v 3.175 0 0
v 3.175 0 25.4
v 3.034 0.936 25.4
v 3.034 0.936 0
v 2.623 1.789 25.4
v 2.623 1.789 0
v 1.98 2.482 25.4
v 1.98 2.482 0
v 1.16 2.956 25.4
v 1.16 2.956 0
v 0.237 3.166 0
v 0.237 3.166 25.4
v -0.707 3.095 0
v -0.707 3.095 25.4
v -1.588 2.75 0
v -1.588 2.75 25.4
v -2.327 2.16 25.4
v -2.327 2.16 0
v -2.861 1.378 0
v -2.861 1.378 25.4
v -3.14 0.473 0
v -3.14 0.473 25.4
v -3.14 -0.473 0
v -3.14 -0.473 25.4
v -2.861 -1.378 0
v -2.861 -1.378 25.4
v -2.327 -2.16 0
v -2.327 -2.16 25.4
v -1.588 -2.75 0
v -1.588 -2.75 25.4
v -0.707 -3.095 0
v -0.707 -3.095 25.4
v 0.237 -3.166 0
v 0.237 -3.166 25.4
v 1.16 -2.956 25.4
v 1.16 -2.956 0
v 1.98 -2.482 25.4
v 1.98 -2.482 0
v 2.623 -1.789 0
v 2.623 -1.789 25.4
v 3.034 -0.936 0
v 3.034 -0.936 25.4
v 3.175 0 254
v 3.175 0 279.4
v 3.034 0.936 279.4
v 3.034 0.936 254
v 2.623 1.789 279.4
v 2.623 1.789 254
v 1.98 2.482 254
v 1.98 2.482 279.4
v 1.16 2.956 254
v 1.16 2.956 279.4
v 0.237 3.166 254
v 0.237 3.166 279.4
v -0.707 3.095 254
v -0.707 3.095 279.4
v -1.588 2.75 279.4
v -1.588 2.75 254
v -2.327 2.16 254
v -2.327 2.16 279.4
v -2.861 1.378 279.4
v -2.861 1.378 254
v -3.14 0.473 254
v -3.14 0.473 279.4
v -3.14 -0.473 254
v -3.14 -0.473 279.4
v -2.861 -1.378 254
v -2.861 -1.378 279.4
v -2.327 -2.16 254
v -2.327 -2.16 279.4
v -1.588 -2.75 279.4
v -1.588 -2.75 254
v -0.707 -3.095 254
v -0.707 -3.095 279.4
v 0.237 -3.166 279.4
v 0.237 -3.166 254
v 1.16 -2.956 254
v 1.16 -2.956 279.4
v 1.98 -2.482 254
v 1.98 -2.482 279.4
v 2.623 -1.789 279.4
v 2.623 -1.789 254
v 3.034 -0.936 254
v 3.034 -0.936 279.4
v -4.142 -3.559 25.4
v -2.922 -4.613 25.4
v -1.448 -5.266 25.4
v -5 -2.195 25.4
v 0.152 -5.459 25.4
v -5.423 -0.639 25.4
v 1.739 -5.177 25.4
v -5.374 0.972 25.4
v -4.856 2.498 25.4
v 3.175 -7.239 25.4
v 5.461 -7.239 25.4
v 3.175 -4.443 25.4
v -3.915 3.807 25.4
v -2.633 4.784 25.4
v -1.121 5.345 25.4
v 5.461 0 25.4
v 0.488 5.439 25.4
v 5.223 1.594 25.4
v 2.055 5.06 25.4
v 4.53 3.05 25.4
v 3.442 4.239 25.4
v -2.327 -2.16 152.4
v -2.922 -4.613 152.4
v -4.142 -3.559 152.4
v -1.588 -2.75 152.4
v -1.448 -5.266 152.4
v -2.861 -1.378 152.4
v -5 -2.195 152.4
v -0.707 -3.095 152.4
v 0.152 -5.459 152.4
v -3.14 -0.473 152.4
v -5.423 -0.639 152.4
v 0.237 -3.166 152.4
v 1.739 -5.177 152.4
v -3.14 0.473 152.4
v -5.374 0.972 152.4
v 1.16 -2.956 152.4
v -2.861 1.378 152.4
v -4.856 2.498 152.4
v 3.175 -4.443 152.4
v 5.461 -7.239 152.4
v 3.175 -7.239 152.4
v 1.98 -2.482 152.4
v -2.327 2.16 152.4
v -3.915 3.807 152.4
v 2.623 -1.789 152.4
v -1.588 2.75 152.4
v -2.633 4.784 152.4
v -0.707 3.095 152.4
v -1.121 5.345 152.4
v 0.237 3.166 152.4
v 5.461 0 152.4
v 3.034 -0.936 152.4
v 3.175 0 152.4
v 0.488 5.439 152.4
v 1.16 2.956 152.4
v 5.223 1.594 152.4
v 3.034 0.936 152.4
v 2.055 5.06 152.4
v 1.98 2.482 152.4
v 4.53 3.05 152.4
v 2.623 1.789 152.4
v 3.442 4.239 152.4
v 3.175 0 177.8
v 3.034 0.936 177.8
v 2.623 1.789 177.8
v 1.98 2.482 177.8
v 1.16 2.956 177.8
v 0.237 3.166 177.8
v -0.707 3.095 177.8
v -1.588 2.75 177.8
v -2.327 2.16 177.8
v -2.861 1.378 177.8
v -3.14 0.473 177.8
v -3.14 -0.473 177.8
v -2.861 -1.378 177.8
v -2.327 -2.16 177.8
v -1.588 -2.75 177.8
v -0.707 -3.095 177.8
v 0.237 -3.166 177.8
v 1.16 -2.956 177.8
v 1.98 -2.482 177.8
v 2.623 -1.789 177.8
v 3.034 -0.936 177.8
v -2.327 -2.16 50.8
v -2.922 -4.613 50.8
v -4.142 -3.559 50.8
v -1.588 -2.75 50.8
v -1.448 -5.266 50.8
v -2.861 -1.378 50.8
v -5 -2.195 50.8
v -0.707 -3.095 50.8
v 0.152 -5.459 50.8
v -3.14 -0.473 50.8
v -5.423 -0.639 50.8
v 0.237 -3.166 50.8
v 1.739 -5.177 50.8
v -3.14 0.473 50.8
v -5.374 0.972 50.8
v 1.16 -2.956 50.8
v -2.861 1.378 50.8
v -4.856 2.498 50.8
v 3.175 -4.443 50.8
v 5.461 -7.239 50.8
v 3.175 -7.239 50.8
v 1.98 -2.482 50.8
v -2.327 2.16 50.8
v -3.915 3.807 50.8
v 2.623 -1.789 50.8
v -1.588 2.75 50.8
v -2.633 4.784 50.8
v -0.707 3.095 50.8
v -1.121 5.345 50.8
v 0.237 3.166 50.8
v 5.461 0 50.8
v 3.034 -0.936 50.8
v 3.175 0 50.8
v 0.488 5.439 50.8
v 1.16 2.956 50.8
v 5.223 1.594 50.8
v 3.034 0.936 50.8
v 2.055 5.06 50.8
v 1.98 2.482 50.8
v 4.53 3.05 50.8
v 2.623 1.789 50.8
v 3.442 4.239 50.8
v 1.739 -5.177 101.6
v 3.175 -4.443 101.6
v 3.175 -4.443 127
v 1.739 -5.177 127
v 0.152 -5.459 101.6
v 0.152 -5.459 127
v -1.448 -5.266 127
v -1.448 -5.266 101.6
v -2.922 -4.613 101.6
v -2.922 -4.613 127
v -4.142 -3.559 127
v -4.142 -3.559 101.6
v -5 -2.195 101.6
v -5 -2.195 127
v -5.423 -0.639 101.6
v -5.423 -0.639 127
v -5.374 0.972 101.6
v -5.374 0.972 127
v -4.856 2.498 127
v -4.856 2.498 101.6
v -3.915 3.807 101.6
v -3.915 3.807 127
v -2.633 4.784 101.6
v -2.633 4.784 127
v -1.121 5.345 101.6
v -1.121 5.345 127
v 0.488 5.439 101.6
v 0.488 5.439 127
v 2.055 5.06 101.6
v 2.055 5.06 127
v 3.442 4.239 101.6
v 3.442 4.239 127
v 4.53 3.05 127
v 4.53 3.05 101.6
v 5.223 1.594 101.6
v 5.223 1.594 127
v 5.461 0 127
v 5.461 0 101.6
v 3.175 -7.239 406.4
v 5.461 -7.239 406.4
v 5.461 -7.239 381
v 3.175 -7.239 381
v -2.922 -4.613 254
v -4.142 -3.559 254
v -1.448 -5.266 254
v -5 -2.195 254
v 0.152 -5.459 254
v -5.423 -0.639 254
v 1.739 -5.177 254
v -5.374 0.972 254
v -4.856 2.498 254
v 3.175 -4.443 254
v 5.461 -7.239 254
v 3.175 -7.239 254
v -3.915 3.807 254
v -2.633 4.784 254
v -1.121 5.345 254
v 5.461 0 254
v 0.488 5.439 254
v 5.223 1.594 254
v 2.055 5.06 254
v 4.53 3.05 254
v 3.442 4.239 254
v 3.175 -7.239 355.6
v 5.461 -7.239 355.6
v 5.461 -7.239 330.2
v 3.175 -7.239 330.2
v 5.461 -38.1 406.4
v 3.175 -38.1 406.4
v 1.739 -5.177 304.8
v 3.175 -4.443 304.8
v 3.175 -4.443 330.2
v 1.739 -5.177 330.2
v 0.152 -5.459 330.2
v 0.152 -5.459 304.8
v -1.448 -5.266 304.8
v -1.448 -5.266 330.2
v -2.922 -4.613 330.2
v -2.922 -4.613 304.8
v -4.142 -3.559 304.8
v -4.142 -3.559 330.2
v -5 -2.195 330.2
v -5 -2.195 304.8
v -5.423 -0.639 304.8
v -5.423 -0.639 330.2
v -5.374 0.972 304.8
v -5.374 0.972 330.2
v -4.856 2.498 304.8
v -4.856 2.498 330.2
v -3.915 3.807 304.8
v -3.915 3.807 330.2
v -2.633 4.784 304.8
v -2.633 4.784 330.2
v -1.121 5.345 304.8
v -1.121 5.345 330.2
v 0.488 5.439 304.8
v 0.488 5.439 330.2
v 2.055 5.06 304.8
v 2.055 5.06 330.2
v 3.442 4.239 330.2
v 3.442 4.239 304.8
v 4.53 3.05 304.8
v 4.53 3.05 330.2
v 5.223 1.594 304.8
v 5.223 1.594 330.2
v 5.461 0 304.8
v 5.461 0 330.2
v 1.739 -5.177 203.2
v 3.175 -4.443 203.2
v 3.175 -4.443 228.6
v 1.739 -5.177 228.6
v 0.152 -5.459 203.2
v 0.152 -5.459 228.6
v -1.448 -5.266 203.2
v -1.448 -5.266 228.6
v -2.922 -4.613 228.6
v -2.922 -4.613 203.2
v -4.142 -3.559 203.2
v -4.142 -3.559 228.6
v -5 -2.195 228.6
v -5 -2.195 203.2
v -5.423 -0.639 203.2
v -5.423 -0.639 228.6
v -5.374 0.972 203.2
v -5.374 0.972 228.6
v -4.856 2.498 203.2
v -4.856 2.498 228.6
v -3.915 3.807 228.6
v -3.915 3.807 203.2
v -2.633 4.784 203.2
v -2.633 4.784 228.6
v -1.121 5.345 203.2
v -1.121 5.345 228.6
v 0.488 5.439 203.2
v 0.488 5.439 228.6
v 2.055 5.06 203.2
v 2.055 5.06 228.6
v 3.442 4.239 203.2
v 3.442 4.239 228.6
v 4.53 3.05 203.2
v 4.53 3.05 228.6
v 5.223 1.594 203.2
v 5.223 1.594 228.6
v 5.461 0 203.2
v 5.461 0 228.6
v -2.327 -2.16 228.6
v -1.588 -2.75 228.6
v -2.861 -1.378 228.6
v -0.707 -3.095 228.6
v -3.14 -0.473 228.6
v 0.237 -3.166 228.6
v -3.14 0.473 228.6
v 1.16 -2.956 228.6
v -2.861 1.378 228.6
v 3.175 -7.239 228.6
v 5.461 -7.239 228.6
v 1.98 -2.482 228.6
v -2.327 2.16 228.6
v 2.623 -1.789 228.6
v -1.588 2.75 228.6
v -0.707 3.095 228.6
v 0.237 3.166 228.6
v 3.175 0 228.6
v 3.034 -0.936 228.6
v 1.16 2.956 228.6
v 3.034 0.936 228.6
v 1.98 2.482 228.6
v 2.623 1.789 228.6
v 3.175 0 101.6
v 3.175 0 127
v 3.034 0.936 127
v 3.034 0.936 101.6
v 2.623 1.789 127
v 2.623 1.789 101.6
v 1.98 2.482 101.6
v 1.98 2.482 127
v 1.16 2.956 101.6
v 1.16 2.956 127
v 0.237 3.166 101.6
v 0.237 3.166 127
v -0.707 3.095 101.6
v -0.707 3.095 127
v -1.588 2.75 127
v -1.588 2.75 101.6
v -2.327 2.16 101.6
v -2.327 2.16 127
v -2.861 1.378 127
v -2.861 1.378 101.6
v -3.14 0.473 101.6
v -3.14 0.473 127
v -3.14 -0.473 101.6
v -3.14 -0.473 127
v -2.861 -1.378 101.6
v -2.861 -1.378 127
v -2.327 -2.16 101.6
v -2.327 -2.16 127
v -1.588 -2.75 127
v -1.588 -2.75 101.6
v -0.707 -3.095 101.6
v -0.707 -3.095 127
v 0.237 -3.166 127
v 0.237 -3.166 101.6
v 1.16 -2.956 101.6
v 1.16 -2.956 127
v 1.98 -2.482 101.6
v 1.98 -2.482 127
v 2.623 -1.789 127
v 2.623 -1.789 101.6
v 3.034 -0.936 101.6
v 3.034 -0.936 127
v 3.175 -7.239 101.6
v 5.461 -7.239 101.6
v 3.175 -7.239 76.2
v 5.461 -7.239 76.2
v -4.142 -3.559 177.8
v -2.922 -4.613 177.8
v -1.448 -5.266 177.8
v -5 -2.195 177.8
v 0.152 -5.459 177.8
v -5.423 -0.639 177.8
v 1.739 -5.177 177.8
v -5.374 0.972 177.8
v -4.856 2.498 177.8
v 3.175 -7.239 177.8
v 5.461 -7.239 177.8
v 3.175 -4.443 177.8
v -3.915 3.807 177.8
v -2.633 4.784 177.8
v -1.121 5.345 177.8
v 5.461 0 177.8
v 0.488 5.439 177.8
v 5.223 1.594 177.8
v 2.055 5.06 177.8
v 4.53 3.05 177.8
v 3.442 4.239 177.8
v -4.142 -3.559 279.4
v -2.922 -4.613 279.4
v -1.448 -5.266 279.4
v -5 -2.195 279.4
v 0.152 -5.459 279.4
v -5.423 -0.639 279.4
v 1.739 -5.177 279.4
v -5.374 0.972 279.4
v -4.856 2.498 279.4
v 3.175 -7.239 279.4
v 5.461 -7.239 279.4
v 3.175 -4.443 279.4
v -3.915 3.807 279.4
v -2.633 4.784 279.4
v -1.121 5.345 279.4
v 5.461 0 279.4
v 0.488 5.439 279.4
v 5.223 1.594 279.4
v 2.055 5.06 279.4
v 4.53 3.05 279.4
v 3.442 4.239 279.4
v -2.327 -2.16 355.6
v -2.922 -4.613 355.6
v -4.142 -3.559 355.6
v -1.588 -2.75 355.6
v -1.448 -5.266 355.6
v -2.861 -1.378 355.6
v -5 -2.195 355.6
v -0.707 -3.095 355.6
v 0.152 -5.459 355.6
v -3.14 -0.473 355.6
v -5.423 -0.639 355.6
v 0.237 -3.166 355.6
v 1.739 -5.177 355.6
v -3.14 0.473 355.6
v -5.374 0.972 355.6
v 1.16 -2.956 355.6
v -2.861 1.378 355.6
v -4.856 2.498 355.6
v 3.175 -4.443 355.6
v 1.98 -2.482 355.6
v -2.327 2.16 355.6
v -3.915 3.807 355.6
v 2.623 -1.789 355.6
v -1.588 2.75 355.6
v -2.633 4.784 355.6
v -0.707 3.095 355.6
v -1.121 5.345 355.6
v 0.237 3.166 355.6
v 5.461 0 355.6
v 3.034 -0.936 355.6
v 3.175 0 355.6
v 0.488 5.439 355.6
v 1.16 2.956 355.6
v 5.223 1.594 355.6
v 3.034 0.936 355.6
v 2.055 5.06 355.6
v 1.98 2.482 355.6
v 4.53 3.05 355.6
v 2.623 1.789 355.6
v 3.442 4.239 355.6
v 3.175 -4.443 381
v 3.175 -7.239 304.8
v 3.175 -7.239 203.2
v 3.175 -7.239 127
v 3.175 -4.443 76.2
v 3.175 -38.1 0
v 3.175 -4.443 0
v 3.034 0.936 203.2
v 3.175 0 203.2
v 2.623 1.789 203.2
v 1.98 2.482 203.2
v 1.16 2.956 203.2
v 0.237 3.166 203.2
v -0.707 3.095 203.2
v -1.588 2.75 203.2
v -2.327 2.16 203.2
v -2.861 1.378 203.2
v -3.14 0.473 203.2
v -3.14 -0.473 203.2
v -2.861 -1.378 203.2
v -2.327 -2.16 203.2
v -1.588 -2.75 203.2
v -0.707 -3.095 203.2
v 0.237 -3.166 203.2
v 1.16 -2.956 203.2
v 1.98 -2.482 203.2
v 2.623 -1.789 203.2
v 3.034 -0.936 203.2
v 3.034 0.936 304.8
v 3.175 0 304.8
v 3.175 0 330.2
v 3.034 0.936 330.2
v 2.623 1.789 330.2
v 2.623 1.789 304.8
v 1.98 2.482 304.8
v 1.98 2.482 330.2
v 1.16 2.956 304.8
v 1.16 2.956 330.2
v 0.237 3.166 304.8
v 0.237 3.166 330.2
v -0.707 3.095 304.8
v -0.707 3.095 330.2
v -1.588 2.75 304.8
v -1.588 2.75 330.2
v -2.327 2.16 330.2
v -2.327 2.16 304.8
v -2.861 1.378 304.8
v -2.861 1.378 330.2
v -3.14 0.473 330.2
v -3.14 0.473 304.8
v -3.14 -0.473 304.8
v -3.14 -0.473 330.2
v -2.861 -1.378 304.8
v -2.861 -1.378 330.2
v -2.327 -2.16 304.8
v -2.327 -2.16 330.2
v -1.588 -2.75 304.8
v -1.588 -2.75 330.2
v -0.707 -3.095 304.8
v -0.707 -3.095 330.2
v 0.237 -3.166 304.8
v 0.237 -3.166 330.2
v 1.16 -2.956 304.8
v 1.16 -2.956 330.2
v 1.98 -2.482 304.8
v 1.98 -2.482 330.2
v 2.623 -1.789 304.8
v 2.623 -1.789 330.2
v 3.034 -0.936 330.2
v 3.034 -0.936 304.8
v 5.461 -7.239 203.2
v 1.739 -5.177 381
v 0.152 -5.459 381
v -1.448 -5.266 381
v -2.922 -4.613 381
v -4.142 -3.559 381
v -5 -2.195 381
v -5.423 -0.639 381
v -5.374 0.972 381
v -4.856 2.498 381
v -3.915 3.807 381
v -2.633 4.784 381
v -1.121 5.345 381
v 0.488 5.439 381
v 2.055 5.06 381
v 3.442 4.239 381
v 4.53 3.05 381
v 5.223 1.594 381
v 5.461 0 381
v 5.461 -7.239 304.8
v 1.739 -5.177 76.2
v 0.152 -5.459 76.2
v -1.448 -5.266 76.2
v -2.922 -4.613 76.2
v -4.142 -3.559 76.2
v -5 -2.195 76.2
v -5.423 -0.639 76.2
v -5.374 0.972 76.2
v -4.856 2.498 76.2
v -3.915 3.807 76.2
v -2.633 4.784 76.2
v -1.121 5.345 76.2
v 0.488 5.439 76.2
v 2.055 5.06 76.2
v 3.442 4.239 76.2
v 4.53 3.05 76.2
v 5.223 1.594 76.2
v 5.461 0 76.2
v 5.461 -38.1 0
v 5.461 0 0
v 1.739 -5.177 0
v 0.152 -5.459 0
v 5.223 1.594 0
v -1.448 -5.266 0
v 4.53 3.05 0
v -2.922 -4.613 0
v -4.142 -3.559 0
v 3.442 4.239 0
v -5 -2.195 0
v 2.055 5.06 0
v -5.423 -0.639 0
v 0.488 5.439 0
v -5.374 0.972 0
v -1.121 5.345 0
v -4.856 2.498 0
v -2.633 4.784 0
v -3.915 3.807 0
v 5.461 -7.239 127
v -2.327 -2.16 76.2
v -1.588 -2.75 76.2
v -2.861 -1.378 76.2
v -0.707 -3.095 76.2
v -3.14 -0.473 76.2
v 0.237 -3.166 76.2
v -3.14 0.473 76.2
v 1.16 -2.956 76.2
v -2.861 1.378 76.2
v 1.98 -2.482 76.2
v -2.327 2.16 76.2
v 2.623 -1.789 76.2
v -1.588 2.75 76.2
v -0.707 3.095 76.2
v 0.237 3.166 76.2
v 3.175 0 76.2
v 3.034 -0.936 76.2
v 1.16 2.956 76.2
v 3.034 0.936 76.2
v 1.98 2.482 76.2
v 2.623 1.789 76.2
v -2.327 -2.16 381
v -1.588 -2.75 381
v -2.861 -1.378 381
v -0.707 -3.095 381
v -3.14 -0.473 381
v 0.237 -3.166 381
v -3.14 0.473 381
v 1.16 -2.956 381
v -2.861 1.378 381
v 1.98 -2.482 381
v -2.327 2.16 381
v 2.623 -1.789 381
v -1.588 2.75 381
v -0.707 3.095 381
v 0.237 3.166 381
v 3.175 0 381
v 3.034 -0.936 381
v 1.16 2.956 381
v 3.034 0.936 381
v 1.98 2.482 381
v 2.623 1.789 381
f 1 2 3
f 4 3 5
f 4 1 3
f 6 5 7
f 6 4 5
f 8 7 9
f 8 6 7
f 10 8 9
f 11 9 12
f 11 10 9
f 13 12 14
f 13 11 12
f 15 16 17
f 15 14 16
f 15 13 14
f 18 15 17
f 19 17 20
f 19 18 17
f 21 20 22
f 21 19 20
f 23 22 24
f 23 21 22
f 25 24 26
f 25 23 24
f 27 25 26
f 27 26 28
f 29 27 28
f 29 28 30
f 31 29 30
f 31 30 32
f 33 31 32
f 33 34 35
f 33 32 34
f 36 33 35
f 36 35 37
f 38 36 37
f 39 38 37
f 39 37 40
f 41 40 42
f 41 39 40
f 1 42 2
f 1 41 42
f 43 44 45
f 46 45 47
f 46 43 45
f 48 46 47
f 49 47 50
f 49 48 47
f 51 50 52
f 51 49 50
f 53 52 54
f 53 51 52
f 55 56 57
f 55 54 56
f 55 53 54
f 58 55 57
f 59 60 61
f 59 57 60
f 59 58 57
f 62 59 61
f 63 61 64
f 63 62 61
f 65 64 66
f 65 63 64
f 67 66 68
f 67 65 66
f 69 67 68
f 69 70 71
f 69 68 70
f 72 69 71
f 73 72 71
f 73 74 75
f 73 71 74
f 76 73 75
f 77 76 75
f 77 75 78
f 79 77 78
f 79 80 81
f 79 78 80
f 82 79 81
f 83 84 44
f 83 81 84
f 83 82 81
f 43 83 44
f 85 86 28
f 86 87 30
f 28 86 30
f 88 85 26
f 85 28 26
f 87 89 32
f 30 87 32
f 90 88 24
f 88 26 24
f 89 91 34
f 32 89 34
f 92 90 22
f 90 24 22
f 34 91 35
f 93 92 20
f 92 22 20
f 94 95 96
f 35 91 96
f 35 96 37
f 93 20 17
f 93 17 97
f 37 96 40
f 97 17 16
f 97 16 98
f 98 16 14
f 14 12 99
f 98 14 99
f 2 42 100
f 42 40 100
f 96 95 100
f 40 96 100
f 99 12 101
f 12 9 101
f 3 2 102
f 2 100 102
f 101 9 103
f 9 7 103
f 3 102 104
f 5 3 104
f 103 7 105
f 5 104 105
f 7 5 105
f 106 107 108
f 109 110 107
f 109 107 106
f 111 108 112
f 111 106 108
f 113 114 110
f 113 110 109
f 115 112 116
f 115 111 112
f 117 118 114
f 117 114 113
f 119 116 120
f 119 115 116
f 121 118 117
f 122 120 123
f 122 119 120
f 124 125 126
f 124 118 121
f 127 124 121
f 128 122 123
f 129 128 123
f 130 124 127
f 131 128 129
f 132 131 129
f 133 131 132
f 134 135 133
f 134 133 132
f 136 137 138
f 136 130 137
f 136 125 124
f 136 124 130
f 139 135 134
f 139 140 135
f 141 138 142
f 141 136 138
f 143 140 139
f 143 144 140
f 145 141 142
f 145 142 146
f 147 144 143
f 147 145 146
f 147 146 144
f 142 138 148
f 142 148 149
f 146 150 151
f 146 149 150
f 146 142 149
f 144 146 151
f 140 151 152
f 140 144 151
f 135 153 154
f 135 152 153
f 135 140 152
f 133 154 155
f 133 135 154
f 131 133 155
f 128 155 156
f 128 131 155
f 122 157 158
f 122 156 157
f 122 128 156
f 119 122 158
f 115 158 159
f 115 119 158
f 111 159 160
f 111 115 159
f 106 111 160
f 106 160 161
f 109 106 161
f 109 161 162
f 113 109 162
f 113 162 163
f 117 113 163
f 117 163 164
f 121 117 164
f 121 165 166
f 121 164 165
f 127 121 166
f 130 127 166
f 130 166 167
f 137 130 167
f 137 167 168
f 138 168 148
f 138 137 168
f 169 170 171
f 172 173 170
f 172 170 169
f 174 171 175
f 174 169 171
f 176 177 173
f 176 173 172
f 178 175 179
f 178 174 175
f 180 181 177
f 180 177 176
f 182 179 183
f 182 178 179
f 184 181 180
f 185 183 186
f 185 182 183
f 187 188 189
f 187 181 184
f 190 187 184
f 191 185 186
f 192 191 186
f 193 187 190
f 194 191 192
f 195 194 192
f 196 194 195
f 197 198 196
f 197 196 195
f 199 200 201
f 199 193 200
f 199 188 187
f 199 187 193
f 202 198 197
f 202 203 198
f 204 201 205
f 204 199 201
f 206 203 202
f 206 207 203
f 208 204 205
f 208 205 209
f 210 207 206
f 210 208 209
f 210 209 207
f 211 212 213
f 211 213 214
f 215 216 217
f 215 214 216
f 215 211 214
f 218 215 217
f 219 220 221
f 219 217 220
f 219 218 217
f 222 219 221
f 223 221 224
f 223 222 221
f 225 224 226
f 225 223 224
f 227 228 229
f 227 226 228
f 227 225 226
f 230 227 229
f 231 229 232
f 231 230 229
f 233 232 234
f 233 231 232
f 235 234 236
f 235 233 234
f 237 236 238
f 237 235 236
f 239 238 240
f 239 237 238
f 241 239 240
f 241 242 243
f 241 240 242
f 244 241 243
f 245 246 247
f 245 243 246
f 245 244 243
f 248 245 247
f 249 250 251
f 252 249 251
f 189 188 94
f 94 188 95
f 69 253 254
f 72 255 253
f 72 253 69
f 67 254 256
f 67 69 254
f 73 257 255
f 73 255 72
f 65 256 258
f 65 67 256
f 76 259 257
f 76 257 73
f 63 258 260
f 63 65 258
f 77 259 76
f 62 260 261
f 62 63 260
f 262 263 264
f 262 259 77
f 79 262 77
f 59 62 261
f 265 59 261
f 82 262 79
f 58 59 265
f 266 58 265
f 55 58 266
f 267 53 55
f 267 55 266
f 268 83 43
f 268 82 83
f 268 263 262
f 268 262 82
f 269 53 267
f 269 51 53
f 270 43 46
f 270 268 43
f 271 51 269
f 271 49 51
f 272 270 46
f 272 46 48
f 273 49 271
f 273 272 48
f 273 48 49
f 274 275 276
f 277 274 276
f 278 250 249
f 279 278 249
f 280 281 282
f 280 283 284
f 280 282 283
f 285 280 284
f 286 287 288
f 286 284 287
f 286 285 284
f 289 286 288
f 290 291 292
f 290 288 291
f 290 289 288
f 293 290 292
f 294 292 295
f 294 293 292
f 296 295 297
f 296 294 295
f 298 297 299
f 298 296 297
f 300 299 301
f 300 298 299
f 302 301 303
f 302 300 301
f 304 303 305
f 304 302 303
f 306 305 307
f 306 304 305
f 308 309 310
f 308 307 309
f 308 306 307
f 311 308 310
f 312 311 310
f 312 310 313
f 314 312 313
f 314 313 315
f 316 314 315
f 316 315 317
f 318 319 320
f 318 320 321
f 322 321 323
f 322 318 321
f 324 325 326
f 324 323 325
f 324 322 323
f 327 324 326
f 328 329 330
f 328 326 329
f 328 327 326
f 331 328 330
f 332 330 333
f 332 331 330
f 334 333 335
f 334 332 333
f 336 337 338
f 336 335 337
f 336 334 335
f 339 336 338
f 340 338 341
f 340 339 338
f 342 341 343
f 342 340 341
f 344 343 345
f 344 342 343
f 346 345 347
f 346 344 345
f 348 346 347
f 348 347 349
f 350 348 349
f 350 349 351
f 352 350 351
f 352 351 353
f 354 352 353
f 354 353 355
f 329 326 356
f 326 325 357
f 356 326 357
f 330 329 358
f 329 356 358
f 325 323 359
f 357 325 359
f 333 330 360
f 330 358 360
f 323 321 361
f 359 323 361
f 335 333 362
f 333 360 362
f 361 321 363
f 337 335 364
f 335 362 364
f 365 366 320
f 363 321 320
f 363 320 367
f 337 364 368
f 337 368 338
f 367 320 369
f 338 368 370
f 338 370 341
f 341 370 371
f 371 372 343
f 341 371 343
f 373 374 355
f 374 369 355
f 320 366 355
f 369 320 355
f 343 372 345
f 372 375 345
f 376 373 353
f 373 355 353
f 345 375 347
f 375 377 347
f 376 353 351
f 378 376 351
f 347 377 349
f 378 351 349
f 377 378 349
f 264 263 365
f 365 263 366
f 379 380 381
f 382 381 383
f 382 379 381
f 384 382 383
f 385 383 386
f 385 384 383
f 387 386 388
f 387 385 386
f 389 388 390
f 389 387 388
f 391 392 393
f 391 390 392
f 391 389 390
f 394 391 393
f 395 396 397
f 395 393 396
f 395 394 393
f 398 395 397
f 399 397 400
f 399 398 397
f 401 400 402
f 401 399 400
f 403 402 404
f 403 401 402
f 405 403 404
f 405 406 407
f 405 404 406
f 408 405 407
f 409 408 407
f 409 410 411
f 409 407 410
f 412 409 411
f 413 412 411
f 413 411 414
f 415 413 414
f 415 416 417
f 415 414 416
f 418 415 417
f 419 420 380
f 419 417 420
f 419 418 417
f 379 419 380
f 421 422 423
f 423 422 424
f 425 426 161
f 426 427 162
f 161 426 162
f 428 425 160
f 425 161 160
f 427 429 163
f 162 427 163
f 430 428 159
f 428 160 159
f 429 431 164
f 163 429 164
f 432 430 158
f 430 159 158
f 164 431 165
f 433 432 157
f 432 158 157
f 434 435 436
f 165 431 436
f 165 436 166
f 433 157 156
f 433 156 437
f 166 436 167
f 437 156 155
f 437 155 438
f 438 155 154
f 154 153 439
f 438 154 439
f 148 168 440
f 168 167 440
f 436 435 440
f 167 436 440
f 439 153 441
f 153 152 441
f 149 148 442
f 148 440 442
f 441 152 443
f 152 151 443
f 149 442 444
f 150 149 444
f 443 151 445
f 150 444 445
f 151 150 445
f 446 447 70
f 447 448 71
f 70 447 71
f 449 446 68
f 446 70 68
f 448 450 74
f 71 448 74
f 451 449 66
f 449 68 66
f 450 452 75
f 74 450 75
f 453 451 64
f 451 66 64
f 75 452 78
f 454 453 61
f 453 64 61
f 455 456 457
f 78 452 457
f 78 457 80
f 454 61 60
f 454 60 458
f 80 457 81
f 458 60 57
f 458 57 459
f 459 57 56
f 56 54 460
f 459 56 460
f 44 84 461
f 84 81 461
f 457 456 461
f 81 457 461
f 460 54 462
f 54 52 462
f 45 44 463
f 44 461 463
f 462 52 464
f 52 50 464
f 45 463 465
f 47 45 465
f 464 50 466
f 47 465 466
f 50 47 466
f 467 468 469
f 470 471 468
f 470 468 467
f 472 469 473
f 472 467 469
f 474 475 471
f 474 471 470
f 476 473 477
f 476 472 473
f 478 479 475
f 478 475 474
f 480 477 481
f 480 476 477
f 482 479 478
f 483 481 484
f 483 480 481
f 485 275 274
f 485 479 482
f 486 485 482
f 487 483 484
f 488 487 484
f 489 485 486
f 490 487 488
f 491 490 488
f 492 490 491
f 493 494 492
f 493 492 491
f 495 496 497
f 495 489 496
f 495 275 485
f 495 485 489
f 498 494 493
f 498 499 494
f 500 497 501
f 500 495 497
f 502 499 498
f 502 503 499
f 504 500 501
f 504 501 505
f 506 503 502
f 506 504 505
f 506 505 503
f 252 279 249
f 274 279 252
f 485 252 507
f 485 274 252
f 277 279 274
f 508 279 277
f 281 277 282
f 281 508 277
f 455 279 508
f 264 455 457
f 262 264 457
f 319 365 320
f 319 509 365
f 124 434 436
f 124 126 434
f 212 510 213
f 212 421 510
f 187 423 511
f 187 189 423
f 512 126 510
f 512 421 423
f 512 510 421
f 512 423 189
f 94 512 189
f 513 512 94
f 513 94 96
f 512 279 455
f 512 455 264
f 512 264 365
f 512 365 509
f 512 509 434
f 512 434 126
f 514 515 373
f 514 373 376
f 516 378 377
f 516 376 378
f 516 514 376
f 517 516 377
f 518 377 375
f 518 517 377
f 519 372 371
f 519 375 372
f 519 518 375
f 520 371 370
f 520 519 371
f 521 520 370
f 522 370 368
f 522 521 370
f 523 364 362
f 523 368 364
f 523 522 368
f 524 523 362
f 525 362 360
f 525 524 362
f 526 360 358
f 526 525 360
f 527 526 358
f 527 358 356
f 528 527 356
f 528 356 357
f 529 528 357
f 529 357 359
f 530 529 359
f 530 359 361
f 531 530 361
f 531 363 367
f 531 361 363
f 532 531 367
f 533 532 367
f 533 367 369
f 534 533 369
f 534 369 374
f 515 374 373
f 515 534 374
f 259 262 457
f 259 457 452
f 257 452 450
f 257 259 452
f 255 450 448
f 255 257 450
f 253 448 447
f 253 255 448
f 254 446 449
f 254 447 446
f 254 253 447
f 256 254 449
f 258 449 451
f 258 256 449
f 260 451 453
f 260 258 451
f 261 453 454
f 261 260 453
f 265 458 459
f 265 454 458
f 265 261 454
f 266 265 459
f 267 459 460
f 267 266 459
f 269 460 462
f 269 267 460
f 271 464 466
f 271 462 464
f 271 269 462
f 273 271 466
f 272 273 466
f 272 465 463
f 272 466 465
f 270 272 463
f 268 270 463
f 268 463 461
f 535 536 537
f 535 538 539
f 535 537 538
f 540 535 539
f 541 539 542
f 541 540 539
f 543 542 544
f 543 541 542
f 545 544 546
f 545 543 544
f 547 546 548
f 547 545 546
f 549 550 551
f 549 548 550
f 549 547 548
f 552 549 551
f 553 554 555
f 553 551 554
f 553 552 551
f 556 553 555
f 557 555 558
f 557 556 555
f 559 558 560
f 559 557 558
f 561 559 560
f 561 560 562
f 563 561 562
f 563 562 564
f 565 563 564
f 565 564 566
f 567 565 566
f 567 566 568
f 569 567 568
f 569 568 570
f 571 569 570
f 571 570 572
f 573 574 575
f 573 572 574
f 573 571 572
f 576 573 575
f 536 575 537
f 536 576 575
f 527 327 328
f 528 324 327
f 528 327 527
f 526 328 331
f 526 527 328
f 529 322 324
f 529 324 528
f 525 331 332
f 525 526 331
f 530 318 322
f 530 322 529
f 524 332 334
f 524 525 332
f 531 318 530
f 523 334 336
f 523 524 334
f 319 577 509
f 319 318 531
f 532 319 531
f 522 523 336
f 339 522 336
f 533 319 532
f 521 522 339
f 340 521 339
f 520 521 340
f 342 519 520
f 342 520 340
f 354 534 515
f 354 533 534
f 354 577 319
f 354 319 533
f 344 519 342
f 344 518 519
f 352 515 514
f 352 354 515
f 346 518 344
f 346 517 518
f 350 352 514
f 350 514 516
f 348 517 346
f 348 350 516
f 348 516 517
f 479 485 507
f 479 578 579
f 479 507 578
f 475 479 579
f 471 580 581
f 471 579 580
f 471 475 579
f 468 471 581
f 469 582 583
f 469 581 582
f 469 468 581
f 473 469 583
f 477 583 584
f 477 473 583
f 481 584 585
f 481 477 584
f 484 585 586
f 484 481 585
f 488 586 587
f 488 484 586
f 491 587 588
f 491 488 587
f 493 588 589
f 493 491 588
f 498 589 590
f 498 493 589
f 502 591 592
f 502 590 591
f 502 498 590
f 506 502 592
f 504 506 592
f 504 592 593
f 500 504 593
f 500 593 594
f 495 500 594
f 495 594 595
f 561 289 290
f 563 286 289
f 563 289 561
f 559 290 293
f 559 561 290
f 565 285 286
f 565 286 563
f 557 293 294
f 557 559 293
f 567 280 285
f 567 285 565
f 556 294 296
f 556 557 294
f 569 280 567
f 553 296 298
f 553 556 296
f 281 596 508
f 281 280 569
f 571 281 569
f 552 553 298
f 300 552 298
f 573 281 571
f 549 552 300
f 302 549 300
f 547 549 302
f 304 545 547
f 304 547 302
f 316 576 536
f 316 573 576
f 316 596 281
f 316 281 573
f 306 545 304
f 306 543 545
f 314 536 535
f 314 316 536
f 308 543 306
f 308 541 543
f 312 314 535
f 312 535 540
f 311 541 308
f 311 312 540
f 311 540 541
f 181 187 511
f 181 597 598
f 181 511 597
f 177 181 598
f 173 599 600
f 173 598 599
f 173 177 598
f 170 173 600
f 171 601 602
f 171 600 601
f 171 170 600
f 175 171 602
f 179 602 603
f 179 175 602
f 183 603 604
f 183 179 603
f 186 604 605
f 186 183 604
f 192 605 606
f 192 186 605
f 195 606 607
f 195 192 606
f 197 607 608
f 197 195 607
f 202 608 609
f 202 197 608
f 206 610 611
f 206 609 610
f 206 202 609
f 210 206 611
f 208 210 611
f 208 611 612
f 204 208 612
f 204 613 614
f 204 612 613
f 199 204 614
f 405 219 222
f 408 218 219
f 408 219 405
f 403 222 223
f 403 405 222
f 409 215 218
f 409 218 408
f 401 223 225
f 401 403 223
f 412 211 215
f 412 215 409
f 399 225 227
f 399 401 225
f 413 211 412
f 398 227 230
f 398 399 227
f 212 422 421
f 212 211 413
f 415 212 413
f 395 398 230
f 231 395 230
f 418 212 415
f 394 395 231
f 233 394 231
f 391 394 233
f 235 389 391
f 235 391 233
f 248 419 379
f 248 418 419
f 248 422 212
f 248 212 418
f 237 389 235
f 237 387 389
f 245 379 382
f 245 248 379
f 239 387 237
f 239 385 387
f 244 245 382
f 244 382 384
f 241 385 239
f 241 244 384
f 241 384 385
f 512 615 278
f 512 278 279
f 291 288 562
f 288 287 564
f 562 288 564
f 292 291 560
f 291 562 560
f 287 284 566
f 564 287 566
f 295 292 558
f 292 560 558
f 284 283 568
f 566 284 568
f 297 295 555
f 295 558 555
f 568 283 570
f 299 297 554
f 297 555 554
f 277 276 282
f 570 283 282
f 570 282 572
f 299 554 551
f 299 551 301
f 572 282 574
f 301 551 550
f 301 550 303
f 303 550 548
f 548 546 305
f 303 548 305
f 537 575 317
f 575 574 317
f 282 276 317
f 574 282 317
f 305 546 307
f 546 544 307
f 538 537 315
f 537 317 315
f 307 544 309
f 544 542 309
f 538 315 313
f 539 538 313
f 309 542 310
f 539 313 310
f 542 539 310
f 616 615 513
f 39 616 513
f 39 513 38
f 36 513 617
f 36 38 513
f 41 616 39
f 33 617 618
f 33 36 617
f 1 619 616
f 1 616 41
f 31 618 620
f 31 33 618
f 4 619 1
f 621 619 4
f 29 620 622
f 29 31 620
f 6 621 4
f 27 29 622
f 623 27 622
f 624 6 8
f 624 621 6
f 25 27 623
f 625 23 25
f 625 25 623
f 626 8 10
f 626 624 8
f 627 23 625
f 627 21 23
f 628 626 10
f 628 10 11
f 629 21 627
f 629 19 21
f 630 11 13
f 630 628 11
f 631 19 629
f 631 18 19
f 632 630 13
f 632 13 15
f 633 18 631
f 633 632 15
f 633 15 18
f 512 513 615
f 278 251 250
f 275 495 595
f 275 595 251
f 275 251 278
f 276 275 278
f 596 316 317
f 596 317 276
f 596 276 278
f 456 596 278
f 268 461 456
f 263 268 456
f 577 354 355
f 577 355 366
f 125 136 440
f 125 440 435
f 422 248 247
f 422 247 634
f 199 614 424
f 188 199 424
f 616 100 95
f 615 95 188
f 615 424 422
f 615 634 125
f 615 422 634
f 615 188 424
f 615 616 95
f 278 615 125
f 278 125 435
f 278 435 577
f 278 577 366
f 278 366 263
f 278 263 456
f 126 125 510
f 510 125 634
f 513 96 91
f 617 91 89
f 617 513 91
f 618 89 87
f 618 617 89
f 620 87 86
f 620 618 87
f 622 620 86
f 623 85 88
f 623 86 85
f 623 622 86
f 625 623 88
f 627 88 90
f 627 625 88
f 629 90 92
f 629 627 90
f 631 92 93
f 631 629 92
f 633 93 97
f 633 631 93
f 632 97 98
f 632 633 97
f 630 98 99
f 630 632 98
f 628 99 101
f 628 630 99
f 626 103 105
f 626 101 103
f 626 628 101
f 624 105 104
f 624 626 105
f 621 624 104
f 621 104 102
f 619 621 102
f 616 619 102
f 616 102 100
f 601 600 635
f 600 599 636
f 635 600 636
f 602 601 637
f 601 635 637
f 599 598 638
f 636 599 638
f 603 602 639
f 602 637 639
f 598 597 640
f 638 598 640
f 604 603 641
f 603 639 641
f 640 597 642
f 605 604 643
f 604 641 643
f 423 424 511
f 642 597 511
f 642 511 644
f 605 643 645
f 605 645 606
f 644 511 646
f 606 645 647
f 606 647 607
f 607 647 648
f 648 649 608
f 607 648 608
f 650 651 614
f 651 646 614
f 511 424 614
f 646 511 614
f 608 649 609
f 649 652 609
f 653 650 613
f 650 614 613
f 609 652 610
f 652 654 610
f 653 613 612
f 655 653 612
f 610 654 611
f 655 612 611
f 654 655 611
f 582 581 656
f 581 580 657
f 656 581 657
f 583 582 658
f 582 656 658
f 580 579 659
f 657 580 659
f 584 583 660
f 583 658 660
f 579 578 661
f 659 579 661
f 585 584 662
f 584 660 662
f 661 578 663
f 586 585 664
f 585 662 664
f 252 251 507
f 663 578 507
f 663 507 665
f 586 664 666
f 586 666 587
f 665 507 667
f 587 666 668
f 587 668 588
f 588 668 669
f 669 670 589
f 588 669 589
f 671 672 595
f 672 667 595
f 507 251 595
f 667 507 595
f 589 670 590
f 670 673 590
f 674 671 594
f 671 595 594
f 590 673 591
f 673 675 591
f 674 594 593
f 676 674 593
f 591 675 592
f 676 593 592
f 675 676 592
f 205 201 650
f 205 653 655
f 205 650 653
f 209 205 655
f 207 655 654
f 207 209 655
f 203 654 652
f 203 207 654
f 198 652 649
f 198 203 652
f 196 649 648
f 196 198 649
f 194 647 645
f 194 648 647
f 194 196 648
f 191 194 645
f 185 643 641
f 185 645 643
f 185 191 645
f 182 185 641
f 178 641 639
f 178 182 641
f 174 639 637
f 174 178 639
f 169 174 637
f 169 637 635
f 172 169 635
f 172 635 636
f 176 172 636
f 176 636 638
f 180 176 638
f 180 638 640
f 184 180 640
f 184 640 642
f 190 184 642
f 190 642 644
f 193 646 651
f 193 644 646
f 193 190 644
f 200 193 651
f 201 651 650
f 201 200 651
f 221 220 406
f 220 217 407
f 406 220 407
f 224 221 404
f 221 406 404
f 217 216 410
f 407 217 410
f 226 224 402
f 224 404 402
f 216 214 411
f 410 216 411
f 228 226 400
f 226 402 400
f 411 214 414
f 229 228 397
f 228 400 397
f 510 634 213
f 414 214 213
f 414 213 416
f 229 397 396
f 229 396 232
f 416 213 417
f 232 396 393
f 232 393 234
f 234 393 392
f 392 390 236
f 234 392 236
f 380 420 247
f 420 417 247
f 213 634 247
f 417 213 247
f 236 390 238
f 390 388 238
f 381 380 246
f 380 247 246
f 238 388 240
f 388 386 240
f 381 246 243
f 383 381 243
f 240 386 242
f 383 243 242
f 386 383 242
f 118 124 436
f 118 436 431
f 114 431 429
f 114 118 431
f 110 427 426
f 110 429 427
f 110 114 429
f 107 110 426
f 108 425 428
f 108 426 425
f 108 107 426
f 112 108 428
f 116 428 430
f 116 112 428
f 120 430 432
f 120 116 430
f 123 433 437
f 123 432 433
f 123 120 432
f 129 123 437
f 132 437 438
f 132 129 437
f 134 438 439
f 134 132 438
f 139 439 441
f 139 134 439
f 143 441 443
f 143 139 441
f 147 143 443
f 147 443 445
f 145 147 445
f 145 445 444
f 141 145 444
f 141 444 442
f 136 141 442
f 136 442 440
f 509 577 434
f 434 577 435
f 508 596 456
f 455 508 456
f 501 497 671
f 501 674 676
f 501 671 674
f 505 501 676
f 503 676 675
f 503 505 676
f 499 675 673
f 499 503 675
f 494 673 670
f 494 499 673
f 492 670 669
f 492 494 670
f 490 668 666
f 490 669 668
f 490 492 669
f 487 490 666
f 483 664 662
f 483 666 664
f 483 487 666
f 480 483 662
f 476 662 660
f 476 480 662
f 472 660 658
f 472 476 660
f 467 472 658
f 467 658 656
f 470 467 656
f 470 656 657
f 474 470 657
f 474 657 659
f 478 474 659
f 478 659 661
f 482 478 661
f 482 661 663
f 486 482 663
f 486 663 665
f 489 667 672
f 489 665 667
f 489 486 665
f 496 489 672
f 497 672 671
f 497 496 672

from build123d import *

# Parameters (mm, degrees)
SKETCH1_R           = 3.175
BOSS_EXTRUDE1_DEPTH = 406.4
SKETCH2_W           = 25.4
SKETCH2_H           = 12.7
CUT_EXTRUDE1_DEPTH  = 11.922
LPATTERN1_COUNT     = 8
LPATTERN1_PITCH     = 50.8


with BuildPart() as part:
    # Sketch1 → Boss-Extrude1 (new body)
    with BuildSketch(Plane.XY):
        with BuildLine():
            Line((5.461, 0), (5.461, -38.1))
            Line((5.461, -38.1), (3.175, -38.1))
            Line((3.175, -38.1), (3.175, -4.443185344))
            ThreePointArc((3.175, -4.443185344), (-4.855985791, 2.498384078), (5.461, 0))
        make_face()
        Circle(SKETCH1_R, mode=Mode.SUBTRACT)
    extrude(amount=BOSS_EXTRUDE1_DEPTH)

    # Sketch2 → Cut-Extrude1 (cut, through all)
    with BuildSketch(Plane(origin=(5.461, 0, 0), x_dir=(0, 0, -1), z_dir=(1, 0, 0))):
        with Locations((-393.7, -0.889)):
            Rectangle(SKETCH2_W, SKETCH2_H)
    cut_extrude1 = extrude(amount=-CUT_EXTRUDE1_DEPTH, mode=Mode.SUBTRACT)

    # LPattern1: Cut-Extrude1 ×8
    with Locations(*[(0, 0, -i * LPATTERN1_PITCH) for i in range(1, LPATTERN1_COUNT)]):
        add(cut_extrude1, mode=Mode.SUBTRACT)


solid = part.part
